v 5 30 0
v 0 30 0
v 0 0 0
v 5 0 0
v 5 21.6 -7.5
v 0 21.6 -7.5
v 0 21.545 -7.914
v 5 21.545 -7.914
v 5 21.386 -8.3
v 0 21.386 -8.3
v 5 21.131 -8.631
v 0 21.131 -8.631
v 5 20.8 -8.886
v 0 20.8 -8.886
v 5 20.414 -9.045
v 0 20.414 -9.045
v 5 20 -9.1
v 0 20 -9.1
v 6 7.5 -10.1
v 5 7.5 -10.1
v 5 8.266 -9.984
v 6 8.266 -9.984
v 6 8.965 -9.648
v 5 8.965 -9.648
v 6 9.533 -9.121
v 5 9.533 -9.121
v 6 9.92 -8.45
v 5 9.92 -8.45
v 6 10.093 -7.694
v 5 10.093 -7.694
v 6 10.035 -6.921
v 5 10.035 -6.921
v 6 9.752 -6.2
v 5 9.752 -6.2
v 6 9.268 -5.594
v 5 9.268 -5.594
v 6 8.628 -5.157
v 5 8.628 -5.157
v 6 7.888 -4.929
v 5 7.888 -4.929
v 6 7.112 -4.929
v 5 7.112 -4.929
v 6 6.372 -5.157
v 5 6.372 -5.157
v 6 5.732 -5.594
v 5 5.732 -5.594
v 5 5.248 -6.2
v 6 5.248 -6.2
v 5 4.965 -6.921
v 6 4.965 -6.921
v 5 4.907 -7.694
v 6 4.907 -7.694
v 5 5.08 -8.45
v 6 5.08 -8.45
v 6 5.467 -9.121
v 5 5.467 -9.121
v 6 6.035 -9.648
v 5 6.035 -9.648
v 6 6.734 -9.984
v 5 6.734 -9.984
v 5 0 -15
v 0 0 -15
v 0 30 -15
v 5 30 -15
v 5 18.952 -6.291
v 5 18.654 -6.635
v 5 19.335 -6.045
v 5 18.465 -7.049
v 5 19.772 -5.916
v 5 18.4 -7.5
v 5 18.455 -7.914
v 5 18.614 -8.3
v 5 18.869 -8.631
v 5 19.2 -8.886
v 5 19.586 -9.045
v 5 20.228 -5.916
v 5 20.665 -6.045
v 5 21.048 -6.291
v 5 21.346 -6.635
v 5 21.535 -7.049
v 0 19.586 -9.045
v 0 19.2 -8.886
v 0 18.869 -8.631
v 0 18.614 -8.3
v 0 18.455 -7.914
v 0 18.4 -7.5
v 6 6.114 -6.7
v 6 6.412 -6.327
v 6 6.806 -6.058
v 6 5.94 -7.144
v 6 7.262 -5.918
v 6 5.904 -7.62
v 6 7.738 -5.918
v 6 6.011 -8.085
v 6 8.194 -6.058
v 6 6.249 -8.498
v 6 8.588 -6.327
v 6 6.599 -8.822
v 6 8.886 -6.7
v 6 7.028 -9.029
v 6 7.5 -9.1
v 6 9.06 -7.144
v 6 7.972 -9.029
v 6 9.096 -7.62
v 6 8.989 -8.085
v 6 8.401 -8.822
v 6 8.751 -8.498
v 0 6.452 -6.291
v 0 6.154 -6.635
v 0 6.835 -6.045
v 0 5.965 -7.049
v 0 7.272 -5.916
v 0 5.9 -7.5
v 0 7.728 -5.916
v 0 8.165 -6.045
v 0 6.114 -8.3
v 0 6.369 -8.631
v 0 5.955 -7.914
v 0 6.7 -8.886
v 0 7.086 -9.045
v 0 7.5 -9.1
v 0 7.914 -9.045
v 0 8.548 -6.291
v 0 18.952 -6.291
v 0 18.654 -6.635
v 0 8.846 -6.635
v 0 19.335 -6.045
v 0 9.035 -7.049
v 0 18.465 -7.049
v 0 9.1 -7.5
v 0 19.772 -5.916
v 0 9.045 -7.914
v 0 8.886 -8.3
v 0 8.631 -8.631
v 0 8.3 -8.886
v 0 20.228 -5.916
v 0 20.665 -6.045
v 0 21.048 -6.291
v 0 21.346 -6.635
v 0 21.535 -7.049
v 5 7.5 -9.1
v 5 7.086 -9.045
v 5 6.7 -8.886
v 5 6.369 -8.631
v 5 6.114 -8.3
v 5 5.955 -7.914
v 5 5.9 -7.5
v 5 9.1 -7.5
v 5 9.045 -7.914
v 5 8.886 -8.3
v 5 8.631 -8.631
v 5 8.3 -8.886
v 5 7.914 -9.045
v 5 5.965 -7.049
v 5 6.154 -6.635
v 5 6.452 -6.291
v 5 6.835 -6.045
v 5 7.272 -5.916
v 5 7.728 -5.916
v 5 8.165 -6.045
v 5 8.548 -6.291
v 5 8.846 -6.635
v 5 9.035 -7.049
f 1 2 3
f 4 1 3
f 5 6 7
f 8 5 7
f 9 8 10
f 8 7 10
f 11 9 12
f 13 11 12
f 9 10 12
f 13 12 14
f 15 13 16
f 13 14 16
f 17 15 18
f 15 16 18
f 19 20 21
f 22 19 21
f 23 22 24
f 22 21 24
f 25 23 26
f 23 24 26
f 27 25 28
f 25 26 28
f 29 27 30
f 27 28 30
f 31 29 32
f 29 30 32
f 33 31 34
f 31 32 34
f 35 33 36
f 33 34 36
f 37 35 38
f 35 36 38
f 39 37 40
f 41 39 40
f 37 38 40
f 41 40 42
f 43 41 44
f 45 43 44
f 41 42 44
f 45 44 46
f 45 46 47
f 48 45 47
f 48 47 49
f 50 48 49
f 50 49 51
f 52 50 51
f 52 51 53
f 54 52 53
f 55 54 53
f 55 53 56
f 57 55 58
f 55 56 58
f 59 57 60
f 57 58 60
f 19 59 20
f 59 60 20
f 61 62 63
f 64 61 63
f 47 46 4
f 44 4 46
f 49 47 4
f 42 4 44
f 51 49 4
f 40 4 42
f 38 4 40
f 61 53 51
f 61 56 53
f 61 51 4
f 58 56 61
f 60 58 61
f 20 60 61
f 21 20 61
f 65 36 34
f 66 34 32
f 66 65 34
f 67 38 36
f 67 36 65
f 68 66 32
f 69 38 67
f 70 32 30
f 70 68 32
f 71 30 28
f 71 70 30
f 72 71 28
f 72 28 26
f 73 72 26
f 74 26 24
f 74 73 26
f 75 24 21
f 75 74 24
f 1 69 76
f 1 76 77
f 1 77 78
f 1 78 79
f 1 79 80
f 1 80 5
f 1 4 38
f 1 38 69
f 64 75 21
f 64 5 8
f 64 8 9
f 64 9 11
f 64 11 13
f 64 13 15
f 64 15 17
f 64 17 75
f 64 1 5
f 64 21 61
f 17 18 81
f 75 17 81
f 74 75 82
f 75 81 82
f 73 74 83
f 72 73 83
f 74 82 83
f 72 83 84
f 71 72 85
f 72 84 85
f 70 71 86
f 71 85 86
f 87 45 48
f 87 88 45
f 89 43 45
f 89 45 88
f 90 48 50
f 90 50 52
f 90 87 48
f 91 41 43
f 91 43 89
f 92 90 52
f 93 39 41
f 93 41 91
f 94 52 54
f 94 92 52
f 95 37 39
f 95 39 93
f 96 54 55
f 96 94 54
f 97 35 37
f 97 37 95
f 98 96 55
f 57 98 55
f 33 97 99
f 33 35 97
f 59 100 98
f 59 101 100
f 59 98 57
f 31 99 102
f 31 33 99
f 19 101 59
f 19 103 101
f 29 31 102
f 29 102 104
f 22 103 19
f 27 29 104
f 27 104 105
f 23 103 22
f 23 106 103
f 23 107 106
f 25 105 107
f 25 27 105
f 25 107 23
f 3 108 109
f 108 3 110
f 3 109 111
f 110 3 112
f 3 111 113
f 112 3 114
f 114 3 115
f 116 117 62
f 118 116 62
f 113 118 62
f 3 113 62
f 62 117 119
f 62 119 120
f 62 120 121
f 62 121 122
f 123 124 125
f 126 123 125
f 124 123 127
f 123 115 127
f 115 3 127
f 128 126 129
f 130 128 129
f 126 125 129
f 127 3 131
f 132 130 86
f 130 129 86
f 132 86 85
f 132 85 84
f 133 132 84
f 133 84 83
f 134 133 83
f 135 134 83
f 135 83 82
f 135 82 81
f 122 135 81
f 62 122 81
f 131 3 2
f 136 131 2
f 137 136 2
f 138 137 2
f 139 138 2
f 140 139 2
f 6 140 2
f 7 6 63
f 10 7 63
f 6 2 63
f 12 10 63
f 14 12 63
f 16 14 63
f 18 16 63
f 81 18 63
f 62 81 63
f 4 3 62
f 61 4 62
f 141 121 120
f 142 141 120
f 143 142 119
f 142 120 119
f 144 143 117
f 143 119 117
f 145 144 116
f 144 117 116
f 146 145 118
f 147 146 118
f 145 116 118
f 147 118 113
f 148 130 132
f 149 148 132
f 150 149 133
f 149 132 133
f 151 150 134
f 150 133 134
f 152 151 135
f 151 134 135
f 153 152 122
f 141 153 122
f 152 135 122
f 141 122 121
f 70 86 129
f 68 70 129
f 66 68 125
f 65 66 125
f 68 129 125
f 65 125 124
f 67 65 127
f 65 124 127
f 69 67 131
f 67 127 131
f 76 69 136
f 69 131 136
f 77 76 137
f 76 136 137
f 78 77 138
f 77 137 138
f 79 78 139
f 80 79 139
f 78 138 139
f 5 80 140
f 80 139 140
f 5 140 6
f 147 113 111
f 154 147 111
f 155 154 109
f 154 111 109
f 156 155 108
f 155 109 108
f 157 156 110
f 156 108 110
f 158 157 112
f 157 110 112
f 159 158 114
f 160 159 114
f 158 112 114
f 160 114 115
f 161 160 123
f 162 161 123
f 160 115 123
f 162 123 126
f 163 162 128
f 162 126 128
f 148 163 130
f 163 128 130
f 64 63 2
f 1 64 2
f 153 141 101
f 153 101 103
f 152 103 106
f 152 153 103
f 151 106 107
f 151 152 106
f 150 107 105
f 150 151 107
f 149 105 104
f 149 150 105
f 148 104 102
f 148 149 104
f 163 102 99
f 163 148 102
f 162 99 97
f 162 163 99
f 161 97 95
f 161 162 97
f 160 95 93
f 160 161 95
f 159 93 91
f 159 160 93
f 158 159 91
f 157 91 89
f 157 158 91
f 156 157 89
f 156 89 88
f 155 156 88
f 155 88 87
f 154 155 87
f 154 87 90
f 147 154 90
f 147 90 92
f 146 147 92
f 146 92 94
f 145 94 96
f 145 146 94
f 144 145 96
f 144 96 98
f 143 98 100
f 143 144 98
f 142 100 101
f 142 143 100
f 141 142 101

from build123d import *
from build123d.topology import SkipClean

# Parameters (mm, degrees)
BOSS_EXTRUDE1_DEPTH = 5
SKETCH2_R           = 2.6
SKETCH2_R_2         = 1.6
EXTRUDE_THIN1_DEPTH = 1


with BuildPart() as part:
    # Sketch1 → Boss-Extrude1 (new body)
    with BuildSketch(Plane(origin=(0, 0, 0), x_dir=(0, 0, -1), z_dir=(1, 0, 0))):
        with BuildLine():
            Line((15, 30), (7.5, 30))
            Line((7.5, 30), (7.5, 21.6))
            ThreePointArc((7.5, 21.6), (8.63137085, 21.13137085), (9.1, 20))
            ThreePointArc((9.1, 20), (8.63137085, 18.86862915), (7.5, 18.4))
            Line((7.5, 18.4), (7.5, 9.1))
            ThreePointArc((7.5, 9.1), (8.63137085, 8.63137085), (9.1, 7.5))
            ThreePointArc((9.1, 7.5), (8.63137085, 6.36862915), (7.5, 5.9))
            Line((7.5, 5.9), (7.5, 0))
            Line((7.5, 0), (15, 0))
            Line((15, 0), (15, 30))
        make_face()
        with BuildLine():
            Line((7.5, 21.6), (7.5, 30))
            Line((7.5, 30), (0, 30))
            Line((0, 30), (0, 0))
            Line((0, 0), (7.5, 0))
            Line((7.5, 0), (7.5, 5.9))
            ThreePointArc((7.5, 5.9), (5.9, 7.5), (7.5, 9.1))
            Line((7.5, 9.1), (7.5, 18.4))
            ThreePointArc((7.5, 18.4), (5.9, 20), (7.5, 21.6))
        make_face()
    extrude(amount=BOSS_EXTRUDE1_DEPTH)

    # Sketch2 → Extrude-Thin1 (add)
    with SkipClean():  # the faces are left unmerged after this step: merging them gives an invalid solid
        with BuildSketch(Plane(origin=(5, 0, 0), x_dir=(0, 0, -1), z_dir=(1, 0, 0))):
            with Locations((7.5, 7.5)):
                Circle(SKETCH2_R)
            with Locations((7.5, 7.5)):
                Circle(SKETCH2_R_2, mode=Mode.SUBTRACT)
        extrude(amount=EXTRUDE_THIN1_DEPTH)


solid = part.part
